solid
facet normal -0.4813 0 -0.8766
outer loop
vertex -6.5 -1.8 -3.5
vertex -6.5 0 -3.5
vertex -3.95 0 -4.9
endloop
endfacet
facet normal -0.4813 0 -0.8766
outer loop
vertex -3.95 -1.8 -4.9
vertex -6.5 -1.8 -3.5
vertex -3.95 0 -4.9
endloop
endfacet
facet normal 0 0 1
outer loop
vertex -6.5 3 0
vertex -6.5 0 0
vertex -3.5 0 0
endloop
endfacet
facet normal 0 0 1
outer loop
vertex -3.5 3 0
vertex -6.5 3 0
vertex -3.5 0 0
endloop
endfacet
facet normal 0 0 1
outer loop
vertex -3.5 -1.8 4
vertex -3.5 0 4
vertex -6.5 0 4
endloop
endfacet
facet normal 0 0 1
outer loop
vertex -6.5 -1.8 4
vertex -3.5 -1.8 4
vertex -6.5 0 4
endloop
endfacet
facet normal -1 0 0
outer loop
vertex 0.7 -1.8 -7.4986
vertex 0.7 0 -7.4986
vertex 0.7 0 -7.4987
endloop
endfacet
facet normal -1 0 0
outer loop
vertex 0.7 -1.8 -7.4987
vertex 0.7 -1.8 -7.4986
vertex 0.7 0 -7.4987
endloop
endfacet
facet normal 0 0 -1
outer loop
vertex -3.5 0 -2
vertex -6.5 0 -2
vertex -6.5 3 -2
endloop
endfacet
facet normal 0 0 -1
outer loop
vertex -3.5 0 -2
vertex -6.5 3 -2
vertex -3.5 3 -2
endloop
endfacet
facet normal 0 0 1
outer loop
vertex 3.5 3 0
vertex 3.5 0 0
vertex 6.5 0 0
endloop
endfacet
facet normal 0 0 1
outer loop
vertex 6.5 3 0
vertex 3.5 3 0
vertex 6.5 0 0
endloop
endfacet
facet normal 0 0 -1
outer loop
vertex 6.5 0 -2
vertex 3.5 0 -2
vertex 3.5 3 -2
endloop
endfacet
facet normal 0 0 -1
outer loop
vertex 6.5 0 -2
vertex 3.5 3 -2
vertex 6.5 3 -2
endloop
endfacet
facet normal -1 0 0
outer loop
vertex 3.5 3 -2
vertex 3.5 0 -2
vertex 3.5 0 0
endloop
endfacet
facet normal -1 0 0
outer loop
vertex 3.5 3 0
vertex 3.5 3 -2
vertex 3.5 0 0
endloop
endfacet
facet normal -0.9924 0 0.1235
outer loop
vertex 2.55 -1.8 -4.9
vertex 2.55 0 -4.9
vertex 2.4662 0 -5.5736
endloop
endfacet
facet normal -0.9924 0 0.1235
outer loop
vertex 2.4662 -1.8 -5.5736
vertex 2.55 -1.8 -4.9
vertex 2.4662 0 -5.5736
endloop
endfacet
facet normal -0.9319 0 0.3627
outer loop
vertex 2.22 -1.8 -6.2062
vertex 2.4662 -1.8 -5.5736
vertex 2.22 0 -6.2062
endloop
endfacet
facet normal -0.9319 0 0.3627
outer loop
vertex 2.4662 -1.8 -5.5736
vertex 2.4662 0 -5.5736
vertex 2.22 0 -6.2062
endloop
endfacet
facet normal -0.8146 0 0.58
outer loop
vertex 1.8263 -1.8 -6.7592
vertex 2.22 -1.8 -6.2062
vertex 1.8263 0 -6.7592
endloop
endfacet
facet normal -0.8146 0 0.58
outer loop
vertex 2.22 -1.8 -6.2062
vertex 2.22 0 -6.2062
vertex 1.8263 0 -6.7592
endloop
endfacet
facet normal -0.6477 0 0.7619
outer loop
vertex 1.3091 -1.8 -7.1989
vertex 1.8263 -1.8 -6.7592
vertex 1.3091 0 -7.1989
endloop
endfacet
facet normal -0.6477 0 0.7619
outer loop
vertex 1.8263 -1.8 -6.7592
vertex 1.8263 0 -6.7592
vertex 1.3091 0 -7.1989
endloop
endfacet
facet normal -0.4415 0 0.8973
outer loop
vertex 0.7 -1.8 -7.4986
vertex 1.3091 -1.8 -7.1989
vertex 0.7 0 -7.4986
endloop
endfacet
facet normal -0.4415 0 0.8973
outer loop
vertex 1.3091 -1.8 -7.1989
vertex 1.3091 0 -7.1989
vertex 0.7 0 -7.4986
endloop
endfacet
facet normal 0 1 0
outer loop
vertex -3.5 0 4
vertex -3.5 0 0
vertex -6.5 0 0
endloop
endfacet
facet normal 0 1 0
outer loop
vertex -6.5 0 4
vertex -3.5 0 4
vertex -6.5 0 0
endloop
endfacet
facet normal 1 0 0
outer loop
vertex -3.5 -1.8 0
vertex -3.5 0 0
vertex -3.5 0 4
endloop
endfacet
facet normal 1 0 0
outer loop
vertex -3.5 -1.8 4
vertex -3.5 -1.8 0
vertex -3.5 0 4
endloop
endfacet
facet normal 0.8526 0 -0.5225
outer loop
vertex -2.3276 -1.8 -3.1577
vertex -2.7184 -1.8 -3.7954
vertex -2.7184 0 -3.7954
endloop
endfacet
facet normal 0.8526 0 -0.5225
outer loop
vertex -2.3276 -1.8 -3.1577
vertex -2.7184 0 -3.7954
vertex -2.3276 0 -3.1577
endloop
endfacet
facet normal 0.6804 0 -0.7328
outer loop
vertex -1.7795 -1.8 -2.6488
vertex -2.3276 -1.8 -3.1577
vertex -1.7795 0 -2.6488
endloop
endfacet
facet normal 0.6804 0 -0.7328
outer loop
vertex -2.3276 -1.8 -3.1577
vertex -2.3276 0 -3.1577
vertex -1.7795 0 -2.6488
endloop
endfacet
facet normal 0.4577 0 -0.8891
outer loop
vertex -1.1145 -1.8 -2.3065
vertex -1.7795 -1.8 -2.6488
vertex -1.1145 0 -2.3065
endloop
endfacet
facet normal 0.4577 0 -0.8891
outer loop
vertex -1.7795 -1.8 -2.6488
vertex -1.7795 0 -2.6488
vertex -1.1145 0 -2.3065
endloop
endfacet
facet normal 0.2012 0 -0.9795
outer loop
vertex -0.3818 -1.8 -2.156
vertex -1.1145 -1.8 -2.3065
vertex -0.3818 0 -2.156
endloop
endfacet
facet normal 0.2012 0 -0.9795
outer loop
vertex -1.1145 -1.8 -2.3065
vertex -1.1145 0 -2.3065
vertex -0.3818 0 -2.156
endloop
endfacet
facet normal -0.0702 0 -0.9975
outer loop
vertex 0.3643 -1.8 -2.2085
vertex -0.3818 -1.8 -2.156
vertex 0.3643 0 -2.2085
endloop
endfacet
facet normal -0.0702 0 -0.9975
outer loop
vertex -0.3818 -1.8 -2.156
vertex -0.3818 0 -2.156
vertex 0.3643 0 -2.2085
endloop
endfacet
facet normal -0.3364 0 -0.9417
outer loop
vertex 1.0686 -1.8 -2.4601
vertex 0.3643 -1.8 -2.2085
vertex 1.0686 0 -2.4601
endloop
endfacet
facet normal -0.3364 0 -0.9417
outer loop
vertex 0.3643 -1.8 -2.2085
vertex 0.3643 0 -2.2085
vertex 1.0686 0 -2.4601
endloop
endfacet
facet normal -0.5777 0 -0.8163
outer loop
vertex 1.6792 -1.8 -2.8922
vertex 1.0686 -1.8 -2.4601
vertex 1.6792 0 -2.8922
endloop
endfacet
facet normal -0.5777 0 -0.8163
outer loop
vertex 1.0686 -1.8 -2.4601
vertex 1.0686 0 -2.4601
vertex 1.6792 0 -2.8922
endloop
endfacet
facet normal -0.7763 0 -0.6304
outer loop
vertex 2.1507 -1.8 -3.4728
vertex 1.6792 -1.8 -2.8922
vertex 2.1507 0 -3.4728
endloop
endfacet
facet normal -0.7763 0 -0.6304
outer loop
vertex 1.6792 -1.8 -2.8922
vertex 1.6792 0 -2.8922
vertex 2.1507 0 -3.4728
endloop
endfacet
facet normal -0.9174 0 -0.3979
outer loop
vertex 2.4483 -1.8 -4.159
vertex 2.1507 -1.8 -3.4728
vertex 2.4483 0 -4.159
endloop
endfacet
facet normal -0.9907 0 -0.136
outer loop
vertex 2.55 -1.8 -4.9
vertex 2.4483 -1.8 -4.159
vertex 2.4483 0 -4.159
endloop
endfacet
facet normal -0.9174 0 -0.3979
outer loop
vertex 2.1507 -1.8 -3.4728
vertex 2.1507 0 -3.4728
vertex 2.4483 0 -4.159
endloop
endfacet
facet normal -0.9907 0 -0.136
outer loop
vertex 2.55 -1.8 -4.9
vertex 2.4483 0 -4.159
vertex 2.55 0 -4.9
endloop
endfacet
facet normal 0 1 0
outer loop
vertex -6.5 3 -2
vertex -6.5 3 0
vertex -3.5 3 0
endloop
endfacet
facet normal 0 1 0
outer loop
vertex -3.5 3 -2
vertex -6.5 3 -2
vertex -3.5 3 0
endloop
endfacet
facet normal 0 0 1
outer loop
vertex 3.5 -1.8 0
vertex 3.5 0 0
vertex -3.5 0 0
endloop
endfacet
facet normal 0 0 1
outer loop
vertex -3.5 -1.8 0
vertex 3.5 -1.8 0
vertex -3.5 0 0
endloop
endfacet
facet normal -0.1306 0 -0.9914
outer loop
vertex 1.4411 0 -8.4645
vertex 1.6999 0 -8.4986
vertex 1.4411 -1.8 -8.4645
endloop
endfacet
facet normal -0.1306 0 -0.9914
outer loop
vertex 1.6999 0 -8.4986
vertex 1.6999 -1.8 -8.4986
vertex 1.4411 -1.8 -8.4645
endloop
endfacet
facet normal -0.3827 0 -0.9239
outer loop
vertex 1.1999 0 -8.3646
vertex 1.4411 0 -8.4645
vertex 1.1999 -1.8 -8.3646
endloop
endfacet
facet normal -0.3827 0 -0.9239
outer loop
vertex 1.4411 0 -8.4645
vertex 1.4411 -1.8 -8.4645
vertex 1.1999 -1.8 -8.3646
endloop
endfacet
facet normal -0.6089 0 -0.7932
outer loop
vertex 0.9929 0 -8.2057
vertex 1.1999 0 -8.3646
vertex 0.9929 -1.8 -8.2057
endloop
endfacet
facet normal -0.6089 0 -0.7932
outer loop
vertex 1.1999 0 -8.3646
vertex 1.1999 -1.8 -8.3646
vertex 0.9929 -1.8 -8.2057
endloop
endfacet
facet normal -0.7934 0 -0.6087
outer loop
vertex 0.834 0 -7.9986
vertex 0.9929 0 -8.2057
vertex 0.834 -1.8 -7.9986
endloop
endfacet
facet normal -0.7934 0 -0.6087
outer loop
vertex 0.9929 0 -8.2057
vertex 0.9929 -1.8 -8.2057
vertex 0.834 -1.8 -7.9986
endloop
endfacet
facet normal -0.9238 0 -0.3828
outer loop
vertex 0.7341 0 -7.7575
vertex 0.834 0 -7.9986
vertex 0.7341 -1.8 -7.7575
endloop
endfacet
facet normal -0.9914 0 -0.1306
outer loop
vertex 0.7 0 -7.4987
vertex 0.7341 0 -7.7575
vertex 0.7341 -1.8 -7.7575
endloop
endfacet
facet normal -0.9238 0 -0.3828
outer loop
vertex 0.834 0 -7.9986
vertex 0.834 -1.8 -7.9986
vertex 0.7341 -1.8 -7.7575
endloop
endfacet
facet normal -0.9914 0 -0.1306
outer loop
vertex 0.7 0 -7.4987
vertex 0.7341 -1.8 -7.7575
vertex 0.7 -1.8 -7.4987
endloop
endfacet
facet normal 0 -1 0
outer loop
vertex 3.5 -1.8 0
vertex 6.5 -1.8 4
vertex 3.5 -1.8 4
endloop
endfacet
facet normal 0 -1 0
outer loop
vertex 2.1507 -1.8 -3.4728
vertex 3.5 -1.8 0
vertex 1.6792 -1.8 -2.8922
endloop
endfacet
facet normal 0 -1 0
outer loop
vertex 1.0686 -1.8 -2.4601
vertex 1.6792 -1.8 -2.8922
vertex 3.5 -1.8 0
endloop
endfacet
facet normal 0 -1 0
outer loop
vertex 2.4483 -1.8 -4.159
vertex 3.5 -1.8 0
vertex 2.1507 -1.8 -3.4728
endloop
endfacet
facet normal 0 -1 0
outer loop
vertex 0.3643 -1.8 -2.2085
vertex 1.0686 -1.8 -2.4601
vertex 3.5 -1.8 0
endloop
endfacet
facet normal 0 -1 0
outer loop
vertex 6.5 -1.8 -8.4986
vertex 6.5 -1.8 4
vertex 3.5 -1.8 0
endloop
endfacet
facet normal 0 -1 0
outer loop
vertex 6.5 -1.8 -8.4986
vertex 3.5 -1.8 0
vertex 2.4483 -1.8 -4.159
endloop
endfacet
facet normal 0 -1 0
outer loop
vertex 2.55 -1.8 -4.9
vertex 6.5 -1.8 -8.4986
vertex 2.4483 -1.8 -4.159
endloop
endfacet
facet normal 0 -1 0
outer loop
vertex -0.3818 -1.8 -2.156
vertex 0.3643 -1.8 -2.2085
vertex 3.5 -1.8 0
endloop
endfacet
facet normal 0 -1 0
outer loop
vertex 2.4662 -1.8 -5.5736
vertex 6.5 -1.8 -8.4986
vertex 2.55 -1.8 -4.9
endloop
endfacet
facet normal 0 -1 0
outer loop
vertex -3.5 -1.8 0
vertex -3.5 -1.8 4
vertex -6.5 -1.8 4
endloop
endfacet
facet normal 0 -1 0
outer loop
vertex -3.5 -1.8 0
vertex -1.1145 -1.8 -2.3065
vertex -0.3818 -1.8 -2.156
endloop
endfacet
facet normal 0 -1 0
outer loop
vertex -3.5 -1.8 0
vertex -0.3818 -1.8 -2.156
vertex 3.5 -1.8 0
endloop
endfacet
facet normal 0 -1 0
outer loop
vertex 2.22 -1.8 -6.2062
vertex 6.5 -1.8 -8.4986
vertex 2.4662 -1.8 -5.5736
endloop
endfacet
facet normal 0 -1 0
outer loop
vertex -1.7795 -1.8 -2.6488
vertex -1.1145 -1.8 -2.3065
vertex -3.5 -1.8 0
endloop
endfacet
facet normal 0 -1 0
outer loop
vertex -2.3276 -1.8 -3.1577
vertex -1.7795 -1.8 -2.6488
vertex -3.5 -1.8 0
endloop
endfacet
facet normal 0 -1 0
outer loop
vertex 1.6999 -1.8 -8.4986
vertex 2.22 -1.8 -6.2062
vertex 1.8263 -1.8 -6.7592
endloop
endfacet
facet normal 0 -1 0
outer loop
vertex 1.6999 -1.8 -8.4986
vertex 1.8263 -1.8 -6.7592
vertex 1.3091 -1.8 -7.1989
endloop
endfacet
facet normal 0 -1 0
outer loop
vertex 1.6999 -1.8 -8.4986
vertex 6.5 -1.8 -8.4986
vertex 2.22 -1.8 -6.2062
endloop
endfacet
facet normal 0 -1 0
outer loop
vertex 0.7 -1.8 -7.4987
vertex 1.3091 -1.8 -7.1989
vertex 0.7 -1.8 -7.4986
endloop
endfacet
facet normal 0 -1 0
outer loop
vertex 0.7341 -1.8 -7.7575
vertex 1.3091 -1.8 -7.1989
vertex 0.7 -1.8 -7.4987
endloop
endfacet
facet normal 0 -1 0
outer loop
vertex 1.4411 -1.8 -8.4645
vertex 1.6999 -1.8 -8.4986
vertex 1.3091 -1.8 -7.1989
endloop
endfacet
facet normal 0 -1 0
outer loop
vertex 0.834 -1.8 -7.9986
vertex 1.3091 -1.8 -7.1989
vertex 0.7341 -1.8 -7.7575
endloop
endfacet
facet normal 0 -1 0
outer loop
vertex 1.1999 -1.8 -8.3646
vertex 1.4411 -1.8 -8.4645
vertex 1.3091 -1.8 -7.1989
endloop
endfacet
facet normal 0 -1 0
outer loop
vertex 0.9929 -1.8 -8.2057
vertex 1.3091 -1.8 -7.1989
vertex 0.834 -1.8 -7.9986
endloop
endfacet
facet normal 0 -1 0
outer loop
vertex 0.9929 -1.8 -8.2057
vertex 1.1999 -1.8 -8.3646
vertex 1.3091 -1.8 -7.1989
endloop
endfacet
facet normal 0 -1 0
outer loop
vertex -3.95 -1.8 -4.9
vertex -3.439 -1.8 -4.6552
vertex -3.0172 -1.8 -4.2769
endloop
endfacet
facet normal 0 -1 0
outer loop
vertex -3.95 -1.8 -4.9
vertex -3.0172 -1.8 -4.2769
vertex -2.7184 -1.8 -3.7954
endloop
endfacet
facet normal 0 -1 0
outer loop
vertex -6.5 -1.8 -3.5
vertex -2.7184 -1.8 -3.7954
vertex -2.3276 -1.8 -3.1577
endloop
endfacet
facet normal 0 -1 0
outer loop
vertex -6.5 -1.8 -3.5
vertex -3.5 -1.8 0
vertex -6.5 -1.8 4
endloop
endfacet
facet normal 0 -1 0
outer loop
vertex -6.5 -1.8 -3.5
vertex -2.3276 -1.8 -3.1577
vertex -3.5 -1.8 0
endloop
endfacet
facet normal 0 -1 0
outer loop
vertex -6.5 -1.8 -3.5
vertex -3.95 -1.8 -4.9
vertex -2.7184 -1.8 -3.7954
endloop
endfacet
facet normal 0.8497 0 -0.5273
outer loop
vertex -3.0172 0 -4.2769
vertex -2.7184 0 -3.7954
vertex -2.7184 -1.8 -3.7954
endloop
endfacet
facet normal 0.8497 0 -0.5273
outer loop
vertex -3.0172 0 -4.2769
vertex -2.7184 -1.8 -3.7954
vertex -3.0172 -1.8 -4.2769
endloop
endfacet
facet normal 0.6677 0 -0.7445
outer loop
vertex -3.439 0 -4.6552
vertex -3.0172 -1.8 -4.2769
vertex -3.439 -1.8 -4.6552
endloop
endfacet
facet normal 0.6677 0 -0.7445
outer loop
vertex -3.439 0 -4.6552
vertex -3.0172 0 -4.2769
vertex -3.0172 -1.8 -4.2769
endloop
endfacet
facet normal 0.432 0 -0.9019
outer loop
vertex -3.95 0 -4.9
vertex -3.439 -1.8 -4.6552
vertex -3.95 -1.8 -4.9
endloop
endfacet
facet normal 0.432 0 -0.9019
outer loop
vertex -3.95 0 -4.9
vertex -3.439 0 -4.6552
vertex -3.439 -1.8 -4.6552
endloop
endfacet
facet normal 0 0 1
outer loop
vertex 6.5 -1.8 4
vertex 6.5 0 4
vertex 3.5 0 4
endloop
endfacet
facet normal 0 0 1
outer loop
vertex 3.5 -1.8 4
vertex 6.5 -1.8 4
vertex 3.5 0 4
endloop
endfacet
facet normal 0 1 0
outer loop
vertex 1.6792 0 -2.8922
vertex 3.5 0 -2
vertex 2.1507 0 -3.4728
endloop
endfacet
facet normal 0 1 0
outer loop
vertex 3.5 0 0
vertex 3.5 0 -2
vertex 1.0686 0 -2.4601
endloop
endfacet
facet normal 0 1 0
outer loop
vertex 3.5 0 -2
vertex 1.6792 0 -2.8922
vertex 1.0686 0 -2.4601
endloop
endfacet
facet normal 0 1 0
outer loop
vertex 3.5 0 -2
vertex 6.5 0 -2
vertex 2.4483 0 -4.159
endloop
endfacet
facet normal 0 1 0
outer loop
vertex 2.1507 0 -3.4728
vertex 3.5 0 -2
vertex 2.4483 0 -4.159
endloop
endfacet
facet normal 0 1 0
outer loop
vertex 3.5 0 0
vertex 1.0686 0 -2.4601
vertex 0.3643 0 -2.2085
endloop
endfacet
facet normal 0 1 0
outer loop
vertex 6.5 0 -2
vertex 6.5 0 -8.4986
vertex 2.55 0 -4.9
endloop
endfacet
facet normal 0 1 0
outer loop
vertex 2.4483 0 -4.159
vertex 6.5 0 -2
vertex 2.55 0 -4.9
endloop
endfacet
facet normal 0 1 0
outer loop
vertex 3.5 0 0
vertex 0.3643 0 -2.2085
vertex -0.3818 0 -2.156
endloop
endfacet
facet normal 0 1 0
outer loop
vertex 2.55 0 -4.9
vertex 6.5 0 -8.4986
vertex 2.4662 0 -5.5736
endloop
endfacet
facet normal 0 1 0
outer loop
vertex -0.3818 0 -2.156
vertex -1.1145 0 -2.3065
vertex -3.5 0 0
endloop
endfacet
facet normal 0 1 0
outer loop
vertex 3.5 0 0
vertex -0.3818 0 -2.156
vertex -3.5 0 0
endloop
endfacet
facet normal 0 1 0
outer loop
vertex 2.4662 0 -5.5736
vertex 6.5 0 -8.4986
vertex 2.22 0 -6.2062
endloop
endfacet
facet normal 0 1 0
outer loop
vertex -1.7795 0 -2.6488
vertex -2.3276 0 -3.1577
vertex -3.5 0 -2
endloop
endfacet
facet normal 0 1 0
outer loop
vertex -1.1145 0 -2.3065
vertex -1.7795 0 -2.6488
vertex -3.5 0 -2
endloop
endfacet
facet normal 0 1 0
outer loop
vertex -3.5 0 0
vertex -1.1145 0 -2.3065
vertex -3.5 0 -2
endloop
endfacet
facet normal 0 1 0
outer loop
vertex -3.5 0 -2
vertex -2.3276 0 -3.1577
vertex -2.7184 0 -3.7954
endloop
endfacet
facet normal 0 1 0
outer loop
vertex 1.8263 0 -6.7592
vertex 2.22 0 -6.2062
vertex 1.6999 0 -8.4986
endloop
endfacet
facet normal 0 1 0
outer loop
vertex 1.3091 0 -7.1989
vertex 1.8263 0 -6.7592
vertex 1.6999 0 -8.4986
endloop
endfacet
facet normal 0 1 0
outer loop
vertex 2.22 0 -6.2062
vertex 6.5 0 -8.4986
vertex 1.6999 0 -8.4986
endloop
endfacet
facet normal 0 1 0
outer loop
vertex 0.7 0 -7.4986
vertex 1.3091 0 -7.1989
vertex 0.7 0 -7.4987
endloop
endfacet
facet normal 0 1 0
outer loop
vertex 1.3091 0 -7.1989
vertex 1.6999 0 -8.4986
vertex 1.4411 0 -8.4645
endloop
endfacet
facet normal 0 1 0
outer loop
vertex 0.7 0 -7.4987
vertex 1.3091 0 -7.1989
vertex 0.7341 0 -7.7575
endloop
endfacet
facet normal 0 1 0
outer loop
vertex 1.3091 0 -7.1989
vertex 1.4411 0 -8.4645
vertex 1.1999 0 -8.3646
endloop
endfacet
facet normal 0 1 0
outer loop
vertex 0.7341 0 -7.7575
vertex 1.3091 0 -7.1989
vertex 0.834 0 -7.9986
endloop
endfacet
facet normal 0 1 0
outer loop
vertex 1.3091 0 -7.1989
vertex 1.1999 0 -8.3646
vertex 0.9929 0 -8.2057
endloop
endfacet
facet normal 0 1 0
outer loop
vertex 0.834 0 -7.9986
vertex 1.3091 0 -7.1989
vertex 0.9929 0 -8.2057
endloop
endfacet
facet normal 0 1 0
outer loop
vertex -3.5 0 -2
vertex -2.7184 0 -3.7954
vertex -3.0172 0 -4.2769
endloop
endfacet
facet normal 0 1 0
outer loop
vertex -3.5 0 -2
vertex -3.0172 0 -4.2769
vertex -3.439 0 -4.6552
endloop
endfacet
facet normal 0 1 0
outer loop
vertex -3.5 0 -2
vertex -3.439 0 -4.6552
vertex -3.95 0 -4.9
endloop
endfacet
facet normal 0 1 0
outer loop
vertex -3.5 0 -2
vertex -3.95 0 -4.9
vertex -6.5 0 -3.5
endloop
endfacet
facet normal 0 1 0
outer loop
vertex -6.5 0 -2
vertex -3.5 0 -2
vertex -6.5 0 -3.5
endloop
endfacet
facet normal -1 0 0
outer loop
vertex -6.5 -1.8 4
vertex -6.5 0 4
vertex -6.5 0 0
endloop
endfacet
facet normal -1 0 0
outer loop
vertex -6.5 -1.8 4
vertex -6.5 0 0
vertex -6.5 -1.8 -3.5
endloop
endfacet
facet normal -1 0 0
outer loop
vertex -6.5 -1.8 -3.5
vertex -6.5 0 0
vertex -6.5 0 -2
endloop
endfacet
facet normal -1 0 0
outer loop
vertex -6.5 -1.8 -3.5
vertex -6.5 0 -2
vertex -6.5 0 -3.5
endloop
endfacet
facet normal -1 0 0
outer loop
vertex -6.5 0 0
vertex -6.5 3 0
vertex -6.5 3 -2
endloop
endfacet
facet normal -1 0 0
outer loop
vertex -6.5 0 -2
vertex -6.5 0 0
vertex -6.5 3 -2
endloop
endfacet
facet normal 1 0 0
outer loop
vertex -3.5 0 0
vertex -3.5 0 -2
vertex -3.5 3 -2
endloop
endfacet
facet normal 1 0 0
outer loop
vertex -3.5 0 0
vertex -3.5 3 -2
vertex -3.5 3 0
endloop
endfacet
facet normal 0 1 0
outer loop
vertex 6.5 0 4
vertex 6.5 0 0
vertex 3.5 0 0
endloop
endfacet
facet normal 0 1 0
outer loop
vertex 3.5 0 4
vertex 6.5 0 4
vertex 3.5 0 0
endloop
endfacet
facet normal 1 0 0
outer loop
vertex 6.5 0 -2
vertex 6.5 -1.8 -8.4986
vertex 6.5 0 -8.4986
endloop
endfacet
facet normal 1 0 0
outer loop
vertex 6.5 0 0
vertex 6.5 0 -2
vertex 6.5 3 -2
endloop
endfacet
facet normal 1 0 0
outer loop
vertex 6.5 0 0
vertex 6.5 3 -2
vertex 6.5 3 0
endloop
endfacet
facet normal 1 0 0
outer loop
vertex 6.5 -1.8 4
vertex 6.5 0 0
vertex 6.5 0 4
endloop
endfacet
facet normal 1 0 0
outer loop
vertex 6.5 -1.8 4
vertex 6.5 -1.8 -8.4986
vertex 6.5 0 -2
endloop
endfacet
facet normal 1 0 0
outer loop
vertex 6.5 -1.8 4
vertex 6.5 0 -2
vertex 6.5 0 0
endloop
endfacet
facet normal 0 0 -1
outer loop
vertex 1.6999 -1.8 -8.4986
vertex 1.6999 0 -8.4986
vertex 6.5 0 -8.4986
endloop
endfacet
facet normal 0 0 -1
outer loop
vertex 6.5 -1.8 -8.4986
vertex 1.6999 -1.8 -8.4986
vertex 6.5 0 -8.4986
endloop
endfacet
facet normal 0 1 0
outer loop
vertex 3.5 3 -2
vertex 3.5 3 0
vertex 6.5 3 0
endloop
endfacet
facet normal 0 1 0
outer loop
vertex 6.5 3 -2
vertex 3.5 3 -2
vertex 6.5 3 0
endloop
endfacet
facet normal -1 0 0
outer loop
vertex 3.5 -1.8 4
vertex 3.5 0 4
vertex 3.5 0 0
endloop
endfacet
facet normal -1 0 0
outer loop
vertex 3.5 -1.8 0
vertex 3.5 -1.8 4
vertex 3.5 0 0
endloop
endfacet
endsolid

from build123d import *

# Parameters (mm, degrees)
BOSS_EXTRUDE1_DEPTH = 1.8
FILLET1_R           = 2
FILLET3_R           = 1
SKETCH2_W           = 3
SKETCH2_H           = 2
BOSS_EXTRUDE2_DEPTH = 3


# Some blends are built 0.0001 mm under size
with BuildPart() as part:
    # Sketch1 → Boss-Extrude1 (new body)
    with BuildSketch(Plane(origin=(0, 0, 0), x_dir=(1, 0, 0), z_dir=(0, 1, 0))):
        with BuildLine():
            Line((6.5, 2.5), (6.5, 0))
            Line((6.5, 0), (6.5, -4))
            Line((6.5, -4), (3.5, -4))
            Line((3.5, -4), (3.5, 0))
            Line((3.5, 0), (-3.5, 0))
            Line((-3.5, 0), (-3.5, -4))
            Line((-3.5, -4), (-6.5, -4))
            Line((-6.5, -4), (-6.5, 0))
            Line((-6.5, 0), (-6.5, 2.5))
            Line((-6.5, 2.5), (-6.5, 3.5))
            Line((-6.5, 3.5), (-3.95, 4.9))
            Line((-3.95, 4.9), (-2.95, 4.9))
            ThreePointArc((-2.95, 4.9), (-0.2, 2.15), (2.55, 4.9))
            ThreePointArc((2.55, 4.9), (2.040256682, 6.494913791), (0.7, 7.498557292))
            Line((0.7, 7.498557292), (0.7, 8.498557292))
            Line((0.7, 8.498557292), (6.5, 8.498557292))
            Line((6.5, 8.498557292), (6.5, 4.9))
            Line((6.5, 4.9), (6.5, 2.5))
        make_face()
    extrude(amount=BOSS_EXTRUDE1_DEPTH)

    # Fillet1
    # the kernel refuses this fillet: 2 mm, written as the material it takes off along each edge
    with BuildSketch(Plane(origin=(-2.95, -2.821440468, -4.9), x_dir=(0.20519567041703107, 0, 0.9787209698591857), z_dir=(0, 1, 0))) as fillet1_piece_1:
        with BuildLine():
            CenterArc((1.538967528, -1.95744194), FILLET1_R, 101.840953646, 48.860489585)
            Line((-0.20519567, -0.97872097), (-0.240078934, -0.95914655))
            ThreePointArc((-0.240078934, -0.95914655), (-0.141746674, -0.481152658), (-0.039148839, 0.008207827))
            Line((-0.039148839, 0.008207827), (0.008207827, 0.039148839))
            ThreePointArc((0.008207827, 0.039148839), (0.564288094, -0.018517333), (1.12036836, 0.039148839))
            Line((1.12036836, 0.039148839), (1.128576187, 0))
        make_face()
    extrude(amount=7.442880936, mode=Mode.SUBTRACT)

    # Fillet3
    fillet3_edges = [part.edges().sort_by_distance(p)[0] for p in [
        (0.7, 0.9, -8.498557292),
    ]]
    fillet(fillet3_edges, radius=FILLET3_R - 0.0001)  # a hair under: the kernel refuses the full size

    # Sketch2 → Boss-Extrude2 (add)
    with BuildSketch(Plane.XZ):
        with Locations((5, -1)):
            Rectangle(SKETCH2_W, SKETCH2_H)
        with Locations((-5, -1)):
            Rectangle(SKETCH2_W, SKETCH2_H)
    extrude(amount=BOSS_EXTRUDE2_DEPTH)


with BuildPart() as body_2:
    # Mirror3: mirrored copy
    add(part.part.mirror(Plane(origin=(0, 0, 0), x_dir=(0, 0, 1), z_dir=(0, -1, 0))))


solid = body_2.part
